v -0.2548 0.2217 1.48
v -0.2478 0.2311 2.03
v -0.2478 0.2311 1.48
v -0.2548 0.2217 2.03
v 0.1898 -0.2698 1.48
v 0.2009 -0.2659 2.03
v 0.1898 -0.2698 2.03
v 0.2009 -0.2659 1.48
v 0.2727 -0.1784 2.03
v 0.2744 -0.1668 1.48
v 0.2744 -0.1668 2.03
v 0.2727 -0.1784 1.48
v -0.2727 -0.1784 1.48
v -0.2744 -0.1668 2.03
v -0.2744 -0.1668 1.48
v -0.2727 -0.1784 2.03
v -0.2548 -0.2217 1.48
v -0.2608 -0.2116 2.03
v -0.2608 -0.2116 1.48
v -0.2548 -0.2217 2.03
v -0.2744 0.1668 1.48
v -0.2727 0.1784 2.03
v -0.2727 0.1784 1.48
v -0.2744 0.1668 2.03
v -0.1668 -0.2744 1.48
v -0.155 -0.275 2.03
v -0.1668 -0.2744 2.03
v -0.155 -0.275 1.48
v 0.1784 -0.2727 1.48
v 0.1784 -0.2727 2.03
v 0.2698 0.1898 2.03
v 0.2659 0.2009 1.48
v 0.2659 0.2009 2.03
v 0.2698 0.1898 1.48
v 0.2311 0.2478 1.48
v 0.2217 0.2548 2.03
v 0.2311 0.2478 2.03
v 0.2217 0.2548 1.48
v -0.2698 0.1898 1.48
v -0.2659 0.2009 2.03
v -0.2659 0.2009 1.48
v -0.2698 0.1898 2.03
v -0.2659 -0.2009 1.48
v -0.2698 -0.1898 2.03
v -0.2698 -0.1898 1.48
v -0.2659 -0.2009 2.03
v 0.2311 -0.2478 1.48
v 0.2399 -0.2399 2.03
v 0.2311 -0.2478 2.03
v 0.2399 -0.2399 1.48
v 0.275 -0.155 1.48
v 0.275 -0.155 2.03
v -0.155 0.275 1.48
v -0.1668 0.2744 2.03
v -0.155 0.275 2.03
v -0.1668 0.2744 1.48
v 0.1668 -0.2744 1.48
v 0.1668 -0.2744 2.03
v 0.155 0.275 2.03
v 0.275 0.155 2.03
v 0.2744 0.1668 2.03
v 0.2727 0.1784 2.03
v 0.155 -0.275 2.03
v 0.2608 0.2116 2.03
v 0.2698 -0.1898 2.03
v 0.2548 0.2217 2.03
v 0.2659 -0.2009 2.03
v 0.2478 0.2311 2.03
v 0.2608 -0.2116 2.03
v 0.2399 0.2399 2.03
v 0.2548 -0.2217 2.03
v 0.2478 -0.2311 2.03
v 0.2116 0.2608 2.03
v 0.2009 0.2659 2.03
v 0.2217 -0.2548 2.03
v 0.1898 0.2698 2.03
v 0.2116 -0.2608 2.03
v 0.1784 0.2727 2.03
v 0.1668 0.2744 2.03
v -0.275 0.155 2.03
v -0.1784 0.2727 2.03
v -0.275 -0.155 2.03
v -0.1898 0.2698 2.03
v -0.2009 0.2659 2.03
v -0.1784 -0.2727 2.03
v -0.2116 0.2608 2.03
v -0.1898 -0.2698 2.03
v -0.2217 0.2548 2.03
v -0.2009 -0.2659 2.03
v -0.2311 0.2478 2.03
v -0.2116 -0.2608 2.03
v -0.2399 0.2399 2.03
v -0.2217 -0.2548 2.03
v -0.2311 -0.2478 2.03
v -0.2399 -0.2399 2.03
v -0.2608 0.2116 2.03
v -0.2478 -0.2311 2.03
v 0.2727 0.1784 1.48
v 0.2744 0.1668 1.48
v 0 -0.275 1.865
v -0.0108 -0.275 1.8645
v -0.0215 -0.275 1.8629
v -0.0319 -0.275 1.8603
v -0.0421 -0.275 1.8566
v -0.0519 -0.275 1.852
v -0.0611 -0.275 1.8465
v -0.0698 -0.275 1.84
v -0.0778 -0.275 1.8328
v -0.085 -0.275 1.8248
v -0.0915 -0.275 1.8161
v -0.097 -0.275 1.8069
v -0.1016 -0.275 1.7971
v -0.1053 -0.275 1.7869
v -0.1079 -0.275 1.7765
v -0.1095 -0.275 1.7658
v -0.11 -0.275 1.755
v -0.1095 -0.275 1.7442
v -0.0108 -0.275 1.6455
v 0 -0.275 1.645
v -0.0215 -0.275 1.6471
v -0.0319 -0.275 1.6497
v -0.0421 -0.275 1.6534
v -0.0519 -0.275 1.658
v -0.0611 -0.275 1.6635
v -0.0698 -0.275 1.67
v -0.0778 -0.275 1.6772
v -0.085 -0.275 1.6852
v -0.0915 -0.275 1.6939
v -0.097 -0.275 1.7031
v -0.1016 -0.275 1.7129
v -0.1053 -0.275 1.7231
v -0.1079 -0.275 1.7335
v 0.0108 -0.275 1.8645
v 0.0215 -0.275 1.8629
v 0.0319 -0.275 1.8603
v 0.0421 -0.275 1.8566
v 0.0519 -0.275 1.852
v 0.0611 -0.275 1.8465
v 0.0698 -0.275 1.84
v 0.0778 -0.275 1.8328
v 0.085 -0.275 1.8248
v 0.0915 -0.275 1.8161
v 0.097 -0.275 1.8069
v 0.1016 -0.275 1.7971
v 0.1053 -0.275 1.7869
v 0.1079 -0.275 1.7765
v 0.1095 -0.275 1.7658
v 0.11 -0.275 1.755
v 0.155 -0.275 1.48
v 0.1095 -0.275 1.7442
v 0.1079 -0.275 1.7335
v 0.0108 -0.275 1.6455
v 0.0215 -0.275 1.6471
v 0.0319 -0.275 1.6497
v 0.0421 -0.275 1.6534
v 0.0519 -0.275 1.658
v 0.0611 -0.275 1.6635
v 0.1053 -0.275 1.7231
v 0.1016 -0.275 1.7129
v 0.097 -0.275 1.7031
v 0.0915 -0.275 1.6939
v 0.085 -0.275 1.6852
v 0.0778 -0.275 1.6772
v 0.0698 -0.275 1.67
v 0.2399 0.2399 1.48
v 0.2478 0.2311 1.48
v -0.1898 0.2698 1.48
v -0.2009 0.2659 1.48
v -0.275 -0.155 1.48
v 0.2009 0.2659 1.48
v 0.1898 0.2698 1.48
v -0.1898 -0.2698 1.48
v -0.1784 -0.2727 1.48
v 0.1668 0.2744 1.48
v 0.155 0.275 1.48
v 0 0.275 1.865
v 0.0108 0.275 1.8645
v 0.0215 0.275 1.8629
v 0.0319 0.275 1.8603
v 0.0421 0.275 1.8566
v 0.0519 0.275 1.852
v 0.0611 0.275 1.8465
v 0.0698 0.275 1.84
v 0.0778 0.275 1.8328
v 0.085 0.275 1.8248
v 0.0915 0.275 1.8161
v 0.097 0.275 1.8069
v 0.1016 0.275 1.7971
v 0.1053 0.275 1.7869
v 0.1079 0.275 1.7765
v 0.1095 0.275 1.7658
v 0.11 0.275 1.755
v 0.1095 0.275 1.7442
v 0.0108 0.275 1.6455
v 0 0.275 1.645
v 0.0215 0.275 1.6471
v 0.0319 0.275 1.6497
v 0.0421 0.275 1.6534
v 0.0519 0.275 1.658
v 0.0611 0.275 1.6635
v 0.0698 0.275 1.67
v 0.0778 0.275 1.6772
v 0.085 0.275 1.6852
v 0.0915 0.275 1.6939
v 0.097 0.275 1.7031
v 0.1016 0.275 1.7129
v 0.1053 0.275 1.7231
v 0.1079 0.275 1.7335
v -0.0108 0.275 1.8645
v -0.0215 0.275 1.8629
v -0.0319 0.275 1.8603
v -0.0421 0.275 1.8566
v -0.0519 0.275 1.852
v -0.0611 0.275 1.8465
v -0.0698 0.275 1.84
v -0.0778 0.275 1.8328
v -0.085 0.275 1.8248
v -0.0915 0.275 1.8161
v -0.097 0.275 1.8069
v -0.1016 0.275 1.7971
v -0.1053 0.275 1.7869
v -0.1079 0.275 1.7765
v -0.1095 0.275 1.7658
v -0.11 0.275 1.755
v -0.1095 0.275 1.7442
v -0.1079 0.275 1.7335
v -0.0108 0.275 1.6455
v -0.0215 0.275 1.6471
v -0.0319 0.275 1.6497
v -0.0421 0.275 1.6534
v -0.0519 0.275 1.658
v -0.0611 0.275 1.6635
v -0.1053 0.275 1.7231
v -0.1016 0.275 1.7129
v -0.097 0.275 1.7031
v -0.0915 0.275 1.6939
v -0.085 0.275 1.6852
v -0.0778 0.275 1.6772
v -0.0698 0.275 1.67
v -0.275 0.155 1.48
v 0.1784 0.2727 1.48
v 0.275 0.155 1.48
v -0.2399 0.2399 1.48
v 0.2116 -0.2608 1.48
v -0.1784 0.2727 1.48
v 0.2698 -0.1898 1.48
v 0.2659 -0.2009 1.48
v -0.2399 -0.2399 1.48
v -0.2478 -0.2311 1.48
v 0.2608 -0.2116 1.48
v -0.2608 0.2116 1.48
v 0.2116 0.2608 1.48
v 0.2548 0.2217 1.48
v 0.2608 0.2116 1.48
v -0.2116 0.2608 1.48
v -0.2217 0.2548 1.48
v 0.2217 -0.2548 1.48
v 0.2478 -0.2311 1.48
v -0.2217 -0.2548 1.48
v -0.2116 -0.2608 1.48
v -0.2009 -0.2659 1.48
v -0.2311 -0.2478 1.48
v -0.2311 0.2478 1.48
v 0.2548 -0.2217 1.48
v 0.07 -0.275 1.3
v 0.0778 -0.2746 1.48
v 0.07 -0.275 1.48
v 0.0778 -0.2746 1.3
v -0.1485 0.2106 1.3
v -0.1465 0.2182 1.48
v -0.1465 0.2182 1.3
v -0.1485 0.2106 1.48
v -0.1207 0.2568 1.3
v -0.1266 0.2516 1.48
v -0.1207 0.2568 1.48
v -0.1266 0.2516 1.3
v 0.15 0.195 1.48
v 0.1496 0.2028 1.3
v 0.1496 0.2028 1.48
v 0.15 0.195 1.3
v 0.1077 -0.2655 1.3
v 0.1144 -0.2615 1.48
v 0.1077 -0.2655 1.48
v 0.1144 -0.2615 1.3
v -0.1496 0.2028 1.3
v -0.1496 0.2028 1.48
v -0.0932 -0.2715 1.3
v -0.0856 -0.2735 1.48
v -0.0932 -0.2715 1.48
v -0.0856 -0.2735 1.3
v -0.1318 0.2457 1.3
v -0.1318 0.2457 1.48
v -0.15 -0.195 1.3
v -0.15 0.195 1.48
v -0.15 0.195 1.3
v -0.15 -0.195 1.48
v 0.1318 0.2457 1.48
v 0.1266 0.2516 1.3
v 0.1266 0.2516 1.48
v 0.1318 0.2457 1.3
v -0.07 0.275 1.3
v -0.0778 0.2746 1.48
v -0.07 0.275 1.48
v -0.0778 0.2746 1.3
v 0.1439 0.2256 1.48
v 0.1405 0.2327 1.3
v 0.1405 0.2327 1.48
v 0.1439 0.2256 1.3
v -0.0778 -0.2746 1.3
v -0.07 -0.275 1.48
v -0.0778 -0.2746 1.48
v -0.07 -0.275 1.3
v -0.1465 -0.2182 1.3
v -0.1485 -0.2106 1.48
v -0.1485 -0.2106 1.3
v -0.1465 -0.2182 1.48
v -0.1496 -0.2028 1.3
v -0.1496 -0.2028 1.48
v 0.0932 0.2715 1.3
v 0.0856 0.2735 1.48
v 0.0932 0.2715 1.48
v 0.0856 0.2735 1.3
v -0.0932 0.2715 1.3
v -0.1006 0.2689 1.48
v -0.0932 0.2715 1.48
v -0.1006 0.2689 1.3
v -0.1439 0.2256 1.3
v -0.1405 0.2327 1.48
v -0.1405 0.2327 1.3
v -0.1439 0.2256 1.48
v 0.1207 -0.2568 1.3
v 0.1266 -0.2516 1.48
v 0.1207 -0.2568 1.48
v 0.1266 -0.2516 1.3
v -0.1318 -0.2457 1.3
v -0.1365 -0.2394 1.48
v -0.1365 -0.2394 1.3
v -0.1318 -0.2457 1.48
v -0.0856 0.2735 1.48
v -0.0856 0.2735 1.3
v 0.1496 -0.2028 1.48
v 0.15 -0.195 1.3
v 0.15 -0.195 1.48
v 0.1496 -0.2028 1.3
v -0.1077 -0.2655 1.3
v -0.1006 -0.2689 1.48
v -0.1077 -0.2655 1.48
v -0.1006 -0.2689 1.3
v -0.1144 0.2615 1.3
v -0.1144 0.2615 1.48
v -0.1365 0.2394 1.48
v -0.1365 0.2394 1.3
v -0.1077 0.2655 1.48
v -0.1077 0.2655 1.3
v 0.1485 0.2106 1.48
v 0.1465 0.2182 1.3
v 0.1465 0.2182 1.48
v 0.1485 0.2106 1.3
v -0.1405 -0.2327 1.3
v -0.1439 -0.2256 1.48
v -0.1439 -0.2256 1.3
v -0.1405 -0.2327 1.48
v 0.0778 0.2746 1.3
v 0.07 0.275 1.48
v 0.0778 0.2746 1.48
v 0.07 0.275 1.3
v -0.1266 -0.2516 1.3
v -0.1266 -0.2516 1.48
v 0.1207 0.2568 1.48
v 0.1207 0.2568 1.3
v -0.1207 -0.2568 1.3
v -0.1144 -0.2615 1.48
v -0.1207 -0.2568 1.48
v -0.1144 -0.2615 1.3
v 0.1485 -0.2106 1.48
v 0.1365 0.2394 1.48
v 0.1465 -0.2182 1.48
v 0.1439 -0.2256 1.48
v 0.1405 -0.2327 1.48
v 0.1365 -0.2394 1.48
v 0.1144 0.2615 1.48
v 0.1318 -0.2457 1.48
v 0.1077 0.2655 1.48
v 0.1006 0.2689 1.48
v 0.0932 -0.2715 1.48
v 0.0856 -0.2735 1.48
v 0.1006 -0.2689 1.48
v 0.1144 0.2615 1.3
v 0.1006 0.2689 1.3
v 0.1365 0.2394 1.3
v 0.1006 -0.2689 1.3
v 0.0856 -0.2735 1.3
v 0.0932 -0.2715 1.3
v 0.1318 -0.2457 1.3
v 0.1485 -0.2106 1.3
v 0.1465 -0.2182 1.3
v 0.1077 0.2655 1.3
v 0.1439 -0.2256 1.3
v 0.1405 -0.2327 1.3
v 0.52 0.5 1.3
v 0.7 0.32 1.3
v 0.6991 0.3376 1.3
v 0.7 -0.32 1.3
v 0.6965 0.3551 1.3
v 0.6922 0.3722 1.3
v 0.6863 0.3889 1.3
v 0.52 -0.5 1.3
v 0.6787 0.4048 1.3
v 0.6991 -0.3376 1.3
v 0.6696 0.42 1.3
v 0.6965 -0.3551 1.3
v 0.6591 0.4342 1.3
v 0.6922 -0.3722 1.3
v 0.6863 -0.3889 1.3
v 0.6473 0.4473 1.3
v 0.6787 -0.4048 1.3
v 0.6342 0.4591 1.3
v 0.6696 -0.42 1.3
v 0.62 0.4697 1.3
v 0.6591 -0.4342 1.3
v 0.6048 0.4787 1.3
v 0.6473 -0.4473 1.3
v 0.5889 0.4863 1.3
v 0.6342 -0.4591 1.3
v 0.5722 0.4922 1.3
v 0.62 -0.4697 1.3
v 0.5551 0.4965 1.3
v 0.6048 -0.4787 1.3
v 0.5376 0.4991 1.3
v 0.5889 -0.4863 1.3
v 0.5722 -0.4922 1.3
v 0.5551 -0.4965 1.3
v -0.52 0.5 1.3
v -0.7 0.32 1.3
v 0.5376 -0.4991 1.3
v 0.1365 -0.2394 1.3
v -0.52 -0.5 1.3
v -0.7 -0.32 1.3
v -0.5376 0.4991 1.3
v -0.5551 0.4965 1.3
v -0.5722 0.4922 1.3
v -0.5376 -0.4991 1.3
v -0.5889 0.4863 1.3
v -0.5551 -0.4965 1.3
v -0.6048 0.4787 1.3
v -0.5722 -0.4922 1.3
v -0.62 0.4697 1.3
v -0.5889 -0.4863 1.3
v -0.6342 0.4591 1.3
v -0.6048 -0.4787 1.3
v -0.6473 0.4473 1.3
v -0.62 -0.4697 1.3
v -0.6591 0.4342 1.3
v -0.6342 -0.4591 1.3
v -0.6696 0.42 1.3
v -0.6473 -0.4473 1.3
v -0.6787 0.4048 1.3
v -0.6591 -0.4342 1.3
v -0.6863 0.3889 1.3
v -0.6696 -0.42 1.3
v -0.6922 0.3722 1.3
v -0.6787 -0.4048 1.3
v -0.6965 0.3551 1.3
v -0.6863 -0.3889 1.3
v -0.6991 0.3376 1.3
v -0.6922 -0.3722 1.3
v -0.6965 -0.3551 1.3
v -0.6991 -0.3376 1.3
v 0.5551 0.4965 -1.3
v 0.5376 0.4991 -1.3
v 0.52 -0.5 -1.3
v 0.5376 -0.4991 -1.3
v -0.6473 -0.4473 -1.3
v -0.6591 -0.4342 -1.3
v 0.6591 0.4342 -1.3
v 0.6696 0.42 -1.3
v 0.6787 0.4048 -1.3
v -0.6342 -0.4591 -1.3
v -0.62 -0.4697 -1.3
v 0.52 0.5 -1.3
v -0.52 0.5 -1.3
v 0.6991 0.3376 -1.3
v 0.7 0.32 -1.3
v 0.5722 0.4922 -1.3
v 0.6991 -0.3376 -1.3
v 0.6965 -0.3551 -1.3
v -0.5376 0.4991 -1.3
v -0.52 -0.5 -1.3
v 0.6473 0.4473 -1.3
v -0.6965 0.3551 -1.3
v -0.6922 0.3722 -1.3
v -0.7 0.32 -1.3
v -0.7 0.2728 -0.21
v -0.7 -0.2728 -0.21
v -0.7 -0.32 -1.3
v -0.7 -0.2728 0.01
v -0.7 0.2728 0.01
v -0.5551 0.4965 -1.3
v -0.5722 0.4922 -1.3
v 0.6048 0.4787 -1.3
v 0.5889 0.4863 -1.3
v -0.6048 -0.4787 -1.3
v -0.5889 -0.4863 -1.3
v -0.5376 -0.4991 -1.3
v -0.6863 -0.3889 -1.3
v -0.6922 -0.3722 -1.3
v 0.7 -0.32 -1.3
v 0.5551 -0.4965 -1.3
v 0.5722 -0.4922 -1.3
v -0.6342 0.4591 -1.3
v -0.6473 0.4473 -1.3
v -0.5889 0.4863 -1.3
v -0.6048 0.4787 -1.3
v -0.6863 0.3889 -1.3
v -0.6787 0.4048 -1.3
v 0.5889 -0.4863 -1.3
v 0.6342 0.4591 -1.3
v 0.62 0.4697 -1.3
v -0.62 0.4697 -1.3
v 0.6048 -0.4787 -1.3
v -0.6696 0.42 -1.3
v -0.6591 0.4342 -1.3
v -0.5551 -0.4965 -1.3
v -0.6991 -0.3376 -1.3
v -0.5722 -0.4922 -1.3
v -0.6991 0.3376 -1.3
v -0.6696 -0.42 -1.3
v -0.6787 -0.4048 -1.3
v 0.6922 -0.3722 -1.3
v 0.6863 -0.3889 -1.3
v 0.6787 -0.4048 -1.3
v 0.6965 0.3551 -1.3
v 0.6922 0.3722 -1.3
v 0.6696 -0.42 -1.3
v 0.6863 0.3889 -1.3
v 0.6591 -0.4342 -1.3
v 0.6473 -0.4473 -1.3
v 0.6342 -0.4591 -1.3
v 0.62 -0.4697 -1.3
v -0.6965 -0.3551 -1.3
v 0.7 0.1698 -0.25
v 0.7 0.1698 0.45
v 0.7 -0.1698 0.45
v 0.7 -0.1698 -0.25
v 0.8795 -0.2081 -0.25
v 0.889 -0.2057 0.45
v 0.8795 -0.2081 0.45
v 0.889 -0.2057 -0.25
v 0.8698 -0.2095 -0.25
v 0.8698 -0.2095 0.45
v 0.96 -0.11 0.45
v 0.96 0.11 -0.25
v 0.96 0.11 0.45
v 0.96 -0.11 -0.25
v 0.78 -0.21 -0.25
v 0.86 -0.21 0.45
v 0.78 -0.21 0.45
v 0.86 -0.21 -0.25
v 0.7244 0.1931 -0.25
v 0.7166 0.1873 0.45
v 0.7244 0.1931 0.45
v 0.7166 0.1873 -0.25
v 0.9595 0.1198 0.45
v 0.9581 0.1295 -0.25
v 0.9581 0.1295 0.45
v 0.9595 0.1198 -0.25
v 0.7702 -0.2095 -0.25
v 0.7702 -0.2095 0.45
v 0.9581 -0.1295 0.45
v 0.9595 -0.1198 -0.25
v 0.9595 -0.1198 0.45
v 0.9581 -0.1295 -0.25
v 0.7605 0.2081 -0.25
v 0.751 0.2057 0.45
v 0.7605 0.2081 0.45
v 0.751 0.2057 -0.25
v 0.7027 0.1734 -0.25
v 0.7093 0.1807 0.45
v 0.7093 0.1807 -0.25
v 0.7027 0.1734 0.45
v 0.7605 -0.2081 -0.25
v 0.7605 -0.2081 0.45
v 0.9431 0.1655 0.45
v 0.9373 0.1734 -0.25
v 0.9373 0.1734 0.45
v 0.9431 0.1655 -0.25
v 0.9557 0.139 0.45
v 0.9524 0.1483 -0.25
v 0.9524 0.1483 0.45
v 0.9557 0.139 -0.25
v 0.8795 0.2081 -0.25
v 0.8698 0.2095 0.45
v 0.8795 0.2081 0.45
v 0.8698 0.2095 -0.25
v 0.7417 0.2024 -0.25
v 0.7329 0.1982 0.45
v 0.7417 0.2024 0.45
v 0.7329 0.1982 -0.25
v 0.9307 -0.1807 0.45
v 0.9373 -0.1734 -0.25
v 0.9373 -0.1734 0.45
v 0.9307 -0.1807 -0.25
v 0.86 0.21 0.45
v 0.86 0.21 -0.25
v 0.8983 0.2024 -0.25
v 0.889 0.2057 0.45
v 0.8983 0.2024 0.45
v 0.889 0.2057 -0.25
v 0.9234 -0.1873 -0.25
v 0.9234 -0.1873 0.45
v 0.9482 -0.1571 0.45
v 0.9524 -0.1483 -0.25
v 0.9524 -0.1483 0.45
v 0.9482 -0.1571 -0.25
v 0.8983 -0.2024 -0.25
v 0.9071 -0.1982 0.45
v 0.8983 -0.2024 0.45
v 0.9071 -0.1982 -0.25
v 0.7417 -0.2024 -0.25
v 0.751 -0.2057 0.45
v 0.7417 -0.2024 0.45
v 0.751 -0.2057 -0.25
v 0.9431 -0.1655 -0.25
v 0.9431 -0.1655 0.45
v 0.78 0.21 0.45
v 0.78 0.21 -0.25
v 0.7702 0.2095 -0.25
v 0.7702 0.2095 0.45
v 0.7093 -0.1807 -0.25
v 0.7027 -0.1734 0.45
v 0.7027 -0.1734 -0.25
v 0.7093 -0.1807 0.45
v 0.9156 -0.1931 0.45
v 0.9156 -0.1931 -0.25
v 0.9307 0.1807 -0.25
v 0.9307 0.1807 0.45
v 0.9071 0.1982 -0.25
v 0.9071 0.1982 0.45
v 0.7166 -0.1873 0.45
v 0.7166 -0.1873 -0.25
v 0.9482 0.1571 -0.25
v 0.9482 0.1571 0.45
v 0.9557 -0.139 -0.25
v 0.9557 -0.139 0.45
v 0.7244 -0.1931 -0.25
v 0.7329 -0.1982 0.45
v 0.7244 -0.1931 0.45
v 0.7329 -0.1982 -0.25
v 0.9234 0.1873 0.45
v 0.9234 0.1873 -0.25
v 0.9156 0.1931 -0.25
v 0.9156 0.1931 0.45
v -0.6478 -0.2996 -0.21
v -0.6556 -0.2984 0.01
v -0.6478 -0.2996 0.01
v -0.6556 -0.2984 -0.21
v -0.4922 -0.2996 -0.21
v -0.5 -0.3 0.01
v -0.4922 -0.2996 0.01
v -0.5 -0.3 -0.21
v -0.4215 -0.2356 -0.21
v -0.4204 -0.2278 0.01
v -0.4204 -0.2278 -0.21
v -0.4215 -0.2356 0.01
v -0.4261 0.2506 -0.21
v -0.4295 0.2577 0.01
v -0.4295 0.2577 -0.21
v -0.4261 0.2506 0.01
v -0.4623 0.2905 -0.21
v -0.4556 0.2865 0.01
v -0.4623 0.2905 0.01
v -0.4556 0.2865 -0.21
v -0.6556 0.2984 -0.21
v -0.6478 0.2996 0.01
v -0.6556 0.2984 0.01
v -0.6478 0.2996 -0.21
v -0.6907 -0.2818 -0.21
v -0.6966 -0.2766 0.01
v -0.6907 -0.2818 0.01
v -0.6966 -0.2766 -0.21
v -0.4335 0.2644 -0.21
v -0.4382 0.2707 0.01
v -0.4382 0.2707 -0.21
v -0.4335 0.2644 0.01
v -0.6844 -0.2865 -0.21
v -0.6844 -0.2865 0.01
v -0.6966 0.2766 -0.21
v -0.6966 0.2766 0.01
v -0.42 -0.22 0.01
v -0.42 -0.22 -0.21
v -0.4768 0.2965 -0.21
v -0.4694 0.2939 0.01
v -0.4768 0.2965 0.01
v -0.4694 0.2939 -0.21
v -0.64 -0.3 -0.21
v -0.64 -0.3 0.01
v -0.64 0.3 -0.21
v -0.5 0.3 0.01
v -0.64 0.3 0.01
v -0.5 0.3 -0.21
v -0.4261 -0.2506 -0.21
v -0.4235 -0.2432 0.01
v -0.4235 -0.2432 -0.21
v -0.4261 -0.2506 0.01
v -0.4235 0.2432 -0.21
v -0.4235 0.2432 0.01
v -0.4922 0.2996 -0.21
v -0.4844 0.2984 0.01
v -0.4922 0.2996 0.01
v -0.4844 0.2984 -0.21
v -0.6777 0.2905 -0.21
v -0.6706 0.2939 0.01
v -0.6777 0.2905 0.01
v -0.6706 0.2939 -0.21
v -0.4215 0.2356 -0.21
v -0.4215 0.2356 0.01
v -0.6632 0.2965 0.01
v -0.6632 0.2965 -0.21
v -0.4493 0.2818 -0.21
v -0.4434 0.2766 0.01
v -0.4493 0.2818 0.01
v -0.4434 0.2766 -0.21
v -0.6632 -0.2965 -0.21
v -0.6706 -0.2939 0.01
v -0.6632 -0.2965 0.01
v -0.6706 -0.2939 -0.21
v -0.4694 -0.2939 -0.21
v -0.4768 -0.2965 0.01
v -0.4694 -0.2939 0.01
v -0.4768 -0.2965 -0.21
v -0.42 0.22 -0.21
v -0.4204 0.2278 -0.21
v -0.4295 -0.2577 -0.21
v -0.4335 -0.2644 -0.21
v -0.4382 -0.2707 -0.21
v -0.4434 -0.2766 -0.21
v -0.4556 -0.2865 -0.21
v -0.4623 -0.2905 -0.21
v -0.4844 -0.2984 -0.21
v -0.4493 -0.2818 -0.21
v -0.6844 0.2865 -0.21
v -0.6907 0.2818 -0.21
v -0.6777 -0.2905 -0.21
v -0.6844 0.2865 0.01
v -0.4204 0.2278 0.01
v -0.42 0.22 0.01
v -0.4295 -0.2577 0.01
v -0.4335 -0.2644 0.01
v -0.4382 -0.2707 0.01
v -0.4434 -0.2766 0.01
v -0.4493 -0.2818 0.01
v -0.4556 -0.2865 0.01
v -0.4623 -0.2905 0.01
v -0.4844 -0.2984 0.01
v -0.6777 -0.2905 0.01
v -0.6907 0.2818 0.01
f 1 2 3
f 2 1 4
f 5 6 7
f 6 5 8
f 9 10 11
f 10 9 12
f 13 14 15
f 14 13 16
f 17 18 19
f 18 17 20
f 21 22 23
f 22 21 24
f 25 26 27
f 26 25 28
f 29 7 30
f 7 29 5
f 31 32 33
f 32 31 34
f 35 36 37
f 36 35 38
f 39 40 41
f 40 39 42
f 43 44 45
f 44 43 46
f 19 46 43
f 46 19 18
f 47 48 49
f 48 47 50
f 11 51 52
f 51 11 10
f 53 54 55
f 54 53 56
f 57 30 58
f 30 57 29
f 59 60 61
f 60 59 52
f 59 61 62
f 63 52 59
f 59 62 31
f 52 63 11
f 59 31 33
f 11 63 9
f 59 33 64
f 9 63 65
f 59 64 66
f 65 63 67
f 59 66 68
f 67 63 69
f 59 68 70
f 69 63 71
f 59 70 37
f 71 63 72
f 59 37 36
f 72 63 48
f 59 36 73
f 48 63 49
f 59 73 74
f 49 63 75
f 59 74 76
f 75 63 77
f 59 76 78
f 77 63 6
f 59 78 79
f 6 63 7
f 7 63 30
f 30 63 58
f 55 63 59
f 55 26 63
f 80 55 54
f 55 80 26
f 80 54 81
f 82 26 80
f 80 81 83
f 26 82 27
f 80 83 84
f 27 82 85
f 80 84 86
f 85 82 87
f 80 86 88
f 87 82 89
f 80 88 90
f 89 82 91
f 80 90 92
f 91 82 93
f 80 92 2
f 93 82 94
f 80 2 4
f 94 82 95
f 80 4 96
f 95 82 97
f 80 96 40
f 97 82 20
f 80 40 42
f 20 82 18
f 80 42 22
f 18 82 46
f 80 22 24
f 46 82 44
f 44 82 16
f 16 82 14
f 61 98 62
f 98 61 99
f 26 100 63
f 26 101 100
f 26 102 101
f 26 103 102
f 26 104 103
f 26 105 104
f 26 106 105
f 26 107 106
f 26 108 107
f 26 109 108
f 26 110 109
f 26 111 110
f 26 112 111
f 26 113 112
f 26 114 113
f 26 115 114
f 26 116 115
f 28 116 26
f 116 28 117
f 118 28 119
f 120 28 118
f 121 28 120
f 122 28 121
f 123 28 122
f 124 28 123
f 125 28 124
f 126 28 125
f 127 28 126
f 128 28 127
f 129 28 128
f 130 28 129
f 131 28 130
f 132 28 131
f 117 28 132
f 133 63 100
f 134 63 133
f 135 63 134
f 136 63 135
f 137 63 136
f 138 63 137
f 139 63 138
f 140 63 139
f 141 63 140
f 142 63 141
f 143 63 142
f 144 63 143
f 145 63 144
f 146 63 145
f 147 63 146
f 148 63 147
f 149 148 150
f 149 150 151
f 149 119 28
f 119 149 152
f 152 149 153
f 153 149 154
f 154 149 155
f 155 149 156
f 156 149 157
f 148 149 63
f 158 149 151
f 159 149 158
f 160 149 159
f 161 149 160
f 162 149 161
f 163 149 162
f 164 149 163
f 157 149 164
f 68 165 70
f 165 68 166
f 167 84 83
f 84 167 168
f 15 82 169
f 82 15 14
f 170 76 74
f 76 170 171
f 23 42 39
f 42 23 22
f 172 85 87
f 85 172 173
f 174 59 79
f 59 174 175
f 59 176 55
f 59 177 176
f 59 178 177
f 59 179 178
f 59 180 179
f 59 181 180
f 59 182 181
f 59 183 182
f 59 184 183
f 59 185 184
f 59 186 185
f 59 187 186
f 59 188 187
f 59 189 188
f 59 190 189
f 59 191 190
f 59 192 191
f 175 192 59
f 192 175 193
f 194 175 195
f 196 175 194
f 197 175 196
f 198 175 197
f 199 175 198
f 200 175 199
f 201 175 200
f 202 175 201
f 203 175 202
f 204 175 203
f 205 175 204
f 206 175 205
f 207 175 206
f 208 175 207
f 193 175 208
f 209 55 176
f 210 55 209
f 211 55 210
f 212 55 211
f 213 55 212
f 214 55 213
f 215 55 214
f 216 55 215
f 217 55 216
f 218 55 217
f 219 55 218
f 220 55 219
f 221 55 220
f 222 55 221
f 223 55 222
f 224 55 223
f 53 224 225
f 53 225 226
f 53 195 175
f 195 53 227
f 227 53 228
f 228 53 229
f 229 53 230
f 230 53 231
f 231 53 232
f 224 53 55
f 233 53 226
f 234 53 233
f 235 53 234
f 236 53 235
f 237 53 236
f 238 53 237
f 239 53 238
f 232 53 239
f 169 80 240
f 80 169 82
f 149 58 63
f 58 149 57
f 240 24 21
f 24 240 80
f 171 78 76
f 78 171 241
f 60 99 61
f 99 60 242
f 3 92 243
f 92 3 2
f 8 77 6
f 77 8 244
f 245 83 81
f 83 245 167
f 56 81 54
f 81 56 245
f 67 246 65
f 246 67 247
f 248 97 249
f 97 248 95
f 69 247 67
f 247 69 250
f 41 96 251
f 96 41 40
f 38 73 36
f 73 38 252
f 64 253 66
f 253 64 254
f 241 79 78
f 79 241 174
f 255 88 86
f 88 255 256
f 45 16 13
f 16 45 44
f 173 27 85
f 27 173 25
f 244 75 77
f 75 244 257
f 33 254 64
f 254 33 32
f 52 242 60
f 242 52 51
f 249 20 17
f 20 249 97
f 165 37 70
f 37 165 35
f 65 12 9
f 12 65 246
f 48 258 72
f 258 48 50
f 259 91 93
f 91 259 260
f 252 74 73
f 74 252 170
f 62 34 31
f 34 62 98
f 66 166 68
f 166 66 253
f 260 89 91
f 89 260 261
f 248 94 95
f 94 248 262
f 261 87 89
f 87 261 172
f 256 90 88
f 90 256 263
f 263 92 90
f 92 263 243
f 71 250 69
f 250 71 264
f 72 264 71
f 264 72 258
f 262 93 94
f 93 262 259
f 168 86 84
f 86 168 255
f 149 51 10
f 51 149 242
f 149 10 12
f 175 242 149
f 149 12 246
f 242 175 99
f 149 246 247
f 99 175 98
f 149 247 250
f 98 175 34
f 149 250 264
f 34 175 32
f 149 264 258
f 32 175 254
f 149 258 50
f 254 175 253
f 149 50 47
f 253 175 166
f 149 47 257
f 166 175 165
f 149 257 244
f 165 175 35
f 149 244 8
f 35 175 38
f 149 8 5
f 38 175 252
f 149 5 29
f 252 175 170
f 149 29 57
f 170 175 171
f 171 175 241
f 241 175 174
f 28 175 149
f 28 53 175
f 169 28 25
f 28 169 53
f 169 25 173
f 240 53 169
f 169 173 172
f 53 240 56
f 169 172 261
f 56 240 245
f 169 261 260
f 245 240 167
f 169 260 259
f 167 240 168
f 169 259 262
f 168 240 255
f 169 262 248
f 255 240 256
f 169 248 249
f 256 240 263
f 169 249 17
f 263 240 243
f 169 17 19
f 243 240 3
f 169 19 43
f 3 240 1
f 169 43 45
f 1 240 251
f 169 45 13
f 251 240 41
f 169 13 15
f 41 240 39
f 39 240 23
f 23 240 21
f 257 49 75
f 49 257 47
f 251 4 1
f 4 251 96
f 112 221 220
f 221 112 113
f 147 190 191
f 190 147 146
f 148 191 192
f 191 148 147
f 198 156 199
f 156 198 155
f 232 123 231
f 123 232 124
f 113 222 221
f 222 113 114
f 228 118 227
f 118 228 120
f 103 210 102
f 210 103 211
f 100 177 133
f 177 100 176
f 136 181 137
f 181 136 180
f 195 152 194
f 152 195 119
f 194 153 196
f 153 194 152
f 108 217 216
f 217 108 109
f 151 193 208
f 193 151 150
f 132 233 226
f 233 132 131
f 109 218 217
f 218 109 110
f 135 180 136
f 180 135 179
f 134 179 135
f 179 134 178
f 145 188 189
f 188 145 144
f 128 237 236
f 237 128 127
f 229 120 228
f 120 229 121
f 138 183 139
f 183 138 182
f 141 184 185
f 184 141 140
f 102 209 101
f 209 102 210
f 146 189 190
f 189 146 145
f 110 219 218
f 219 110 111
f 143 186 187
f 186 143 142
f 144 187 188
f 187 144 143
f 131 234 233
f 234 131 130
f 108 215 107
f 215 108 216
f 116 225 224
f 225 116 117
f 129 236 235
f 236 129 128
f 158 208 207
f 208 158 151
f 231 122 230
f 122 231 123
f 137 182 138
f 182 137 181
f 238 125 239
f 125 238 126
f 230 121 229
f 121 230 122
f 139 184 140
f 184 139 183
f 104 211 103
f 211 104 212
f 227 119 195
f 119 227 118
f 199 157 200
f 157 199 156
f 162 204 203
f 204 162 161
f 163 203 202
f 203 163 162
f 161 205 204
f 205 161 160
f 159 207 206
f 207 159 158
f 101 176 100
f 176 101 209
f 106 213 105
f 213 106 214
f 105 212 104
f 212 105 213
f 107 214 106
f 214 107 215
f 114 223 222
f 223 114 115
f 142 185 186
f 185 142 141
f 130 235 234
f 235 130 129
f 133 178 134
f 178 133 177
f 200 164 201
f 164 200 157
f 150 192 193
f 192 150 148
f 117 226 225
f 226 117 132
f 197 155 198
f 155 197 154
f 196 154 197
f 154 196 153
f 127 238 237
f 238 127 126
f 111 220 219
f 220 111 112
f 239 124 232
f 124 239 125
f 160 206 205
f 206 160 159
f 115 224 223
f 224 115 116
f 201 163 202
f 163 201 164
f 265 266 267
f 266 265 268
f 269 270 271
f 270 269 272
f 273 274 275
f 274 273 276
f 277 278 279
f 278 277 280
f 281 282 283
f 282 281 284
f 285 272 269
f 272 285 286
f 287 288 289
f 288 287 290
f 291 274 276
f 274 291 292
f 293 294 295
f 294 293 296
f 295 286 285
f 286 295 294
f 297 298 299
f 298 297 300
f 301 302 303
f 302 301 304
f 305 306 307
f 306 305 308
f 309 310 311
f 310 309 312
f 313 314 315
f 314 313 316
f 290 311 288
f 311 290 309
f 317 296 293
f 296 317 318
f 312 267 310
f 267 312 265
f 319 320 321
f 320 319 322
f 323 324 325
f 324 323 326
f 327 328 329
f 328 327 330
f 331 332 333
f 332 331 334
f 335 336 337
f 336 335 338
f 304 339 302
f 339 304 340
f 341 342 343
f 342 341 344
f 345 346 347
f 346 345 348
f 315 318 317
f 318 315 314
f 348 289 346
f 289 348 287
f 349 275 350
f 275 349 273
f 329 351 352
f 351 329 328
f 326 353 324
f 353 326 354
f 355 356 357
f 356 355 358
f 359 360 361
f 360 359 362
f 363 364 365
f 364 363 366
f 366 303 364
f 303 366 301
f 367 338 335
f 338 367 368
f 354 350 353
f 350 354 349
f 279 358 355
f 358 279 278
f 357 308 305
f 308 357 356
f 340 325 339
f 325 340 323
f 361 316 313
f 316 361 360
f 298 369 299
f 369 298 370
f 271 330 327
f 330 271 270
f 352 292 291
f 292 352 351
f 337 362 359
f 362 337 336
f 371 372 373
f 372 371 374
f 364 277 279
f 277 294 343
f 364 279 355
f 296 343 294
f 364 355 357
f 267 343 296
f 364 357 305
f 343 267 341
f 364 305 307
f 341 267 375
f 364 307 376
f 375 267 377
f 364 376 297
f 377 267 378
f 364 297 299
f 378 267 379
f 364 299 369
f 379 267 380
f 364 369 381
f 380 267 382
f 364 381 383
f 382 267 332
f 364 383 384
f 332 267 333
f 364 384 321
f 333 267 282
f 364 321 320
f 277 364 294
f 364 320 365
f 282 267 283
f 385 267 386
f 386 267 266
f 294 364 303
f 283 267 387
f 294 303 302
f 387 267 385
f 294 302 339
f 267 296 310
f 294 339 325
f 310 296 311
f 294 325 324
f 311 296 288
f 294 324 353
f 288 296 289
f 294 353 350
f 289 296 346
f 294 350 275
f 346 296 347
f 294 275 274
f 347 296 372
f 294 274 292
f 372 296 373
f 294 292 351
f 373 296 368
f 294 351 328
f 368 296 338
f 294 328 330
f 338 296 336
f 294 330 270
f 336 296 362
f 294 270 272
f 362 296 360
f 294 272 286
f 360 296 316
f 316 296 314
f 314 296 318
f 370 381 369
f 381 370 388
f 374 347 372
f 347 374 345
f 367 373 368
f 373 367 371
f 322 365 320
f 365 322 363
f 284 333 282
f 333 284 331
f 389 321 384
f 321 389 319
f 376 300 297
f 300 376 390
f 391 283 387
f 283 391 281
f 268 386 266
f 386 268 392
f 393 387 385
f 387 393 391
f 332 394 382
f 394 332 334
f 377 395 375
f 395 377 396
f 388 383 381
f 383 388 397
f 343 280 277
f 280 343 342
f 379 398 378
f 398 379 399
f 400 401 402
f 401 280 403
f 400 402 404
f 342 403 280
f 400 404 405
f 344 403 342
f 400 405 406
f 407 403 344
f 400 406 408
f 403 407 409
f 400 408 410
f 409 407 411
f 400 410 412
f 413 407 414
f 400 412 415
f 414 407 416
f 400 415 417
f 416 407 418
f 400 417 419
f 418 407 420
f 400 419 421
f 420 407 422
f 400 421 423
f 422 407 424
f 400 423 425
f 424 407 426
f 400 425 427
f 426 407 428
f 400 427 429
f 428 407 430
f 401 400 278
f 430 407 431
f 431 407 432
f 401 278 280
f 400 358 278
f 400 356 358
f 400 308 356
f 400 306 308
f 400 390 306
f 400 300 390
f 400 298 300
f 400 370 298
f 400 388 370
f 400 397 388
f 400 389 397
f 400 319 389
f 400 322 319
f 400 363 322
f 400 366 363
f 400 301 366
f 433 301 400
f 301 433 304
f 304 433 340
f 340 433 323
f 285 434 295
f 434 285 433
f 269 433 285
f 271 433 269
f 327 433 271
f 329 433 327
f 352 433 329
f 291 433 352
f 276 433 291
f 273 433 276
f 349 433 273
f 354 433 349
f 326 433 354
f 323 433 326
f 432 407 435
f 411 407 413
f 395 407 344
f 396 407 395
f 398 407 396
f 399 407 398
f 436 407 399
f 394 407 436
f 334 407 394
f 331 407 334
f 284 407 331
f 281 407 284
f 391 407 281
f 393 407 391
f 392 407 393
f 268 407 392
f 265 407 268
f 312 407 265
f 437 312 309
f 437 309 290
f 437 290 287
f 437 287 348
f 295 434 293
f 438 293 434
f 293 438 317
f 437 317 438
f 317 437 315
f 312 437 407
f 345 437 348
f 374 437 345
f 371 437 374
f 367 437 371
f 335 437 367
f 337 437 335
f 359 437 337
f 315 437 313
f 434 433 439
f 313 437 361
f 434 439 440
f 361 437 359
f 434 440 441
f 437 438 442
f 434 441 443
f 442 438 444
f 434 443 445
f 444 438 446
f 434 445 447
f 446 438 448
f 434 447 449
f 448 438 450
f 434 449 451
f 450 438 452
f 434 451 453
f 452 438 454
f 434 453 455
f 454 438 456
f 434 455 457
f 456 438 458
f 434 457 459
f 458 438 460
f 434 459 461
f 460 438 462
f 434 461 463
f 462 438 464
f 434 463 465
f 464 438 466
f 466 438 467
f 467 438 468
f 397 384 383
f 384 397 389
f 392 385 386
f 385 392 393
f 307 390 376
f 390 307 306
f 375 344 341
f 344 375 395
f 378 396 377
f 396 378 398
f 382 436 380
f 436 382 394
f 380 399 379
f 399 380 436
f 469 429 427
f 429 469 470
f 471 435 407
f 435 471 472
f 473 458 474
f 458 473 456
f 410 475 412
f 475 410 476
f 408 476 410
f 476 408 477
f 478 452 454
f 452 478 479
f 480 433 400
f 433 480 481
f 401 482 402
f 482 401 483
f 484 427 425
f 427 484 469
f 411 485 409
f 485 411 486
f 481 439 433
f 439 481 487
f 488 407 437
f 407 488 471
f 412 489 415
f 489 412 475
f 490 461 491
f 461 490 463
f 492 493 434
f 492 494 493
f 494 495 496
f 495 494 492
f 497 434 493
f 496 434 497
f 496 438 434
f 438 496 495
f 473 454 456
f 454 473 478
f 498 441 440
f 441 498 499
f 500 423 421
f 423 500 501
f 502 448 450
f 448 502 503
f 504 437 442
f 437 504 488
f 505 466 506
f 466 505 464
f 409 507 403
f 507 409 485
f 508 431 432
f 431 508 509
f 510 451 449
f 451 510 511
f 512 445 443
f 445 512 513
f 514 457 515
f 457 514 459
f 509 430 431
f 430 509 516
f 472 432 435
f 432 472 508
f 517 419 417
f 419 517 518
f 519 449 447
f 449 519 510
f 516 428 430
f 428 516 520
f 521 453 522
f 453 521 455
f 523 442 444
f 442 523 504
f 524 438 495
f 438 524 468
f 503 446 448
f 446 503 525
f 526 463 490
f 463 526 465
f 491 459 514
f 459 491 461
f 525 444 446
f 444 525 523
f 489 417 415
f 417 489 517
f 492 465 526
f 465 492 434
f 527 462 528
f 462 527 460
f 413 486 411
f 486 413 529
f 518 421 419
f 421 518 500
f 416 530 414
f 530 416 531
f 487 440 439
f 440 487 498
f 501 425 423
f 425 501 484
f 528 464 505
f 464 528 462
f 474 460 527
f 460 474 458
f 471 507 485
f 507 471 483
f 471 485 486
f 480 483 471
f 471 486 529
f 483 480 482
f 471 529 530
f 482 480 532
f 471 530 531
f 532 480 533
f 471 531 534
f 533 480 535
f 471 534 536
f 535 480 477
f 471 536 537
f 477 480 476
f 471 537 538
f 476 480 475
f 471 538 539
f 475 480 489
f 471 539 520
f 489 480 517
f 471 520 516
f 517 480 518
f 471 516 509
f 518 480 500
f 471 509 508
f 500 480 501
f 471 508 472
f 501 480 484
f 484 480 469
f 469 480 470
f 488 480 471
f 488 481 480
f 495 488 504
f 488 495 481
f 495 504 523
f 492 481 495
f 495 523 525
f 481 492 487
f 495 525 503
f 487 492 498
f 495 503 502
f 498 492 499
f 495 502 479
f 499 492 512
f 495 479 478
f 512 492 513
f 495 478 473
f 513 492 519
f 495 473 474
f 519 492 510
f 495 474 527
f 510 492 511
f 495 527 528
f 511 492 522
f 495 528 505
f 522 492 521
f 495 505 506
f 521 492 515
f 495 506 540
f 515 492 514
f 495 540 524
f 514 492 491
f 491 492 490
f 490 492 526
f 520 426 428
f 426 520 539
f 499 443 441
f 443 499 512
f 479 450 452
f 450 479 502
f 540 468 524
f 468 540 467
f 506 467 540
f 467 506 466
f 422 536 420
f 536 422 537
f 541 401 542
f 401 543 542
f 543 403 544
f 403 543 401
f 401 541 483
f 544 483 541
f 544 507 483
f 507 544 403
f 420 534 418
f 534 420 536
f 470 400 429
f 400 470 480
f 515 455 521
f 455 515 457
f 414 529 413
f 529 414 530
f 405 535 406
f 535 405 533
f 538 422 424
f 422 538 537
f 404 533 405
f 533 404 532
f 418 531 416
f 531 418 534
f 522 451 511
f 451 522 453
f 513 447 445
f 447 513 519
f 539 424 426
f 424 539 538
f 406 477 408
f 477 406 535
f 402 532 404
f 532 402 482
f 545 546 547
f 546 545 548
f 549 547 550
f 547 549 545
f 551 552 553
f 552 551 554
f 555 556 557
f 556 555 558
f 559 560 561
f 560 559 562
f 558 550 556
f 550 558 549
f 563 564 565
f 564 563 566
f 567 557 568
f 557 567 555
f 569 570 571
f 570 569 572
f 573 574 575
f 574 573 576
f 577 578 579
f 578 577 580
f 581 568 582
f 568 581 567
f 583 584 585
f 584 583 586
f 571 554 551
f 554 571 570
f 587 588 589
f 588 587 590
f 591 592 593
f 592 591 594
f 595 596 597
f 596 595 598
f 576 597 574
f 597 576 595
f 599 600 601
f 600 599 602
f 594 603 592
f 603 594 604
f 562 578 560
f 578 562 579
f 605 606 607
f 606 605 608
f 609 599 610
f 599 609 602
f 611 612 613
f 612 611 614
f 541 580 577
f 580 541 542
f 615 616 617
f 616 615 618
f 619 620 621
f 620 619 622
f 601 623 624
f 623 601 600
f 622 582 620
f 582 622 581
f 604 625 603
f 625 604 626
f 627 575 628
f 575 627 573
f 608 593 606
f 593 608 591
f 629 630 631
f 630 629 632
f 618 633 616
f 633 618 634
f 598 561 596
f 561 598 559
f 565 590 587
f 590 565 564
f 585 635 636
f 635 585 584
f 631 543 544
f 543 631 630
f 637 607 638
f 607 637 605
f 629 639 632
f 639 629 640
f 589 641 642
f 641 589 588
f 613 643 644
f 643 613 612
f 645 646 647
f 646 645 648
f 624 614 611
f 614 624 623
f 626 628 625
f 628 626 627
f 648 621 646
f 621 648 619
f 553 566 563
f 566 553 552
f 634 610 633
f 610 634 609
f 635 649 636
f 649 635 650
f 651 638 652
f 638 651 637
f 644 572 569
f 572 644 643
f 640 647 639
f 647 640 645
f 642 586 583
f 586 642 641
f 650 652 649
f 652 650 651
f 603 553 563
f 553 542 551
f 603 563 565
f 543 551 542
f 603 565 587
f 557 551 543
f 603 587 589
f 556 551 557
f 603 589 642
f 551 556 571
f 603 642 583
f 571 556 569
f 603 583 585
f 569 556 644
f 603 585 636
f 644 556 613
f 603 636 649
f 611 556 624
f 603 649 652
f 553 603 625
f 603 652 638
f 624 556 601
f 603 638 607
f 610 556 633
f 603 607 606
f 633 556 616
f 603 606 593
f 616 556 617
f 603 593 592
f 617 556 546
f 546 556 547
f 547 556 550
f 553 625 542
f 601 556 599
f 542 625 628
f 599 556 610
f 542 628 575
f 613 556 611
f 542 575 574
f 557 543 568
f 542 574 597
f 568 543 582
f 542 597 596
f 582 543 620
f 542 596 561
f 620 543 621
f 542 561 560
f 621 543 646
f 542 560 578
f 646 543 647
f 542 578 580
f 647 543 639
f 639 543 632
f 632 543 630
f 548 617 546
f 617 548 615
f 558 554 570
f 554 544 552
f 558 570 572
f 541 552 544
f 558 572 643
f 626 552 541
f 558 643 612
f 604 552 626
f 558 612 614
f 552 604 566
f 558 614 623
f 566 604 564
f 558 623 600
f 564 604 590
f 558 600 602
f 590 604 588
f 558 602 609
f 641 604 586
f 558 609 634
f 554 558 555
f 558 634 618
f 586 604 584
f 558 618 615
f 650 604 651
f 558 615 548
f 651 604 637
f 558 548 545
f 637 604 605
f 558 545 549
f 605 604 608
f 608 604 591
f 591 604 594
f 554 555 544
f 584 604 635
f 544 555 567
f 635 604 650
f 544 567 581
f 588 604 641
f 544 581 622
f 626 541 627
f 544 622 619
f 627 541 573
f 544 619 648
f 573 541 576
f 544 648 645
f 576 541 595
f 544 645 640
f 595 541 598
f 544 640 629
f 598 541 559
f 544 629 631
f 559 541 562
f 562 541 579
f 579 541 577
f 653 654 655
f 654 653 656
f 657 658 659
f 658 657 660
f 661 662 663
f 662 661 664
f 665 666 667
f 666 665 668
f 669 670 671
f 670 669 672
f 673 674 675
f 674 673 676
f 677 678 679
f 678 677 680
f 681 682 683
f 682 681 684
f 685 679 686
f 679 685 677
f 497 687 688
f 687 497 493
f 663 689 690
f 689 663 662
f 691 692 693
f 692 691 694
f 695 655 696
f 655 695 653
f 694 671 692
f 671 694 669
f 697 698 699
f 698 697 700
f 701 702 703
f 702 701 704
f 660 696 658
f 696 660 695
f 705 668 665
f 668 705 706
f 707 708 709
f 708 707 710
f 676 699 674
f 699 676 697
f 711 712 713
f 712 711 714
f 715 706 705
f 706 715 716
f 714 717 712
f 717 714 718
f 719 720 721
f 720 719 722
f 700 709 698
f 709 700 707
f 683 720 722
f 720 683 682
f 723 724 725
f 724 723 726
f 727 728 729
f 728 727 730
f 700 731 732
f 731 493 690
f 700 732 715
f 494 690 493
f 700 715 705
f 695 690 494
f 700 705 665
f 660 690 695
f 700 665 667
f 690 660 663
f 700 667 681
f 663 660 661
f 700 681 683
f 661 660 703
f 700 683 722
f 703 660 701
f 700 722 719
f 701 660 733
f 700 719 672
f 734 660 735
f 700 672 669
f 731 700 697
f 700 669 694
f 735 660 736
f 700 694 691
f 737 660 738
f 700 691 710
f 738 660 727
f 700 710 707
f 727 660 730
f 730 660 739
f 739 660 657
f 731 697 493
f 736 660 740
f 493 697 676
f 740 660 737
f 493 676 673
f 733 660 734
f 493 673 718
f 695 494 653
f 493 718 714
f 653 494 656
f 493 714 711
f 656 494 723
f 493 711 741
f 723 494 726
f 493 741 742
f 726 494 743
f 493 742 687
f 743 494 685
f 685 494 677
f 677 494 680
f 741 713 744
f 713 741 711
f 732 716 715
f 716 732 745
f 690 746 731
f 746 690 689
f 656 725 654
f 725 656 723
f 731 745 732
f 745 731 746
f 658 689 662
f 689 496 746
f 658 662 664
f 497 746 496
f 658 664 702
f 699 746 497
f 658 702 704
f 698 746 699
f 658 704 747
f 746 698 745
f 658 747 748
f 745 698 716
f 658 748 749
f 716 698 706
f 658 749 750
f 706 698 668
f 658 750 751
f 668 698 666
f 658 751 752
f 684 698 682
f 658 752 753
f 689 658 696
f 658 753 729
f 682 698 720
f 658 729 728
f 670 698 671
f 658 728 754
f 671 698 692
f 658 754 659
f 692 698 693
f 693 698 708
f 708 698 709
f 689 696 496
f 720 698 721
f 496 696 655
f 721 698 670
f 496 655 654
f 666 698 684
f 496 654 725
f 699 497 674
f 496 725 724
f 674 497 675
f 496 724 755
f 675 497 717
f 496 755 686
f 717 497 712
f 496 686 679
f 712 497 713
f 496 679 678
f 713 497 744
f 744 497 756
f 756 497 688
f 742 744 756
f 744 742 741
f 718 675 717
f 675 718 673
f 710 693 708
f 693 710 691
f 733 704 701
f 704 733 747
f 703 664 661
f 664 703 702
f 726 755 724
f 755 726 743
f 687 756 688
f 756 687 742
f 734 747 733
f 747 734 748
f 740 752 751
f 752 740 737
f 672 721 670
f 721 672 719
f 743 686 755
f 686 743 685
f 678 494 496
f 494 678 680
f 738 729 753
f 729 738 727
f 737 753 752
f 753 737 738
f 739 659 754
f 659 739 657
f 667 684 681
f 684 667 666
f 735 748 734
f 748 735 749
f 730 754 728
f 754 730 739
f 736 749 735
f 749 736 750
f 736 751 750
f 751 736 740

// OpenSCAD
$fn=64;

module rounded_box(size=[1.4,1.0,2.6], r=0.18){
    x=size[0]; y=size[1]; z=size[2];
    r2=min(r, x/2-0.001, y/2-0.001);
    linear_extrude(height=z, center=true)
        offset(r=r2)
            square([x-2*r2, y-2*r2], center=true);
}

module latch_boss(boss=[0.28,0.42,0.70], r=0.10){
    bx=boss[0]; by=boss[1]; bz=boss[2];
    r2=min(r, bx/2-0.001, by/2-0.001);
    linear_extrude(height=bz, center=true)
        offset(r=r2)
            square([bx-2*r2, by-2*r2], center=true);
}

module tab_with_hole(tab_len=0.55, tab_w=0.55, tab_t=0.55, neck_len=0.18, neck_w=0.30, hole_d=0.22, r=0.12){
    union(){
        translate([0,0,(2.6/2) + neck_len/2])
            linear_extrude(height=neck_len, center=true)
                offset(r=min(0.08, neck_w/2-0.001, 1.0))
                    square([neck_w-2*min(0.08, neck_w/2-0.001, 1.0), 0.55-2*min(0.08, neck_w/2-0.001, 1.0)], center=true);

        translate([0,0,(2.6/2) + neck_len + tab_len/2])
            difference(){
                linear_extrude(height=tab_len, center=true)
                    offset(r=min(r, tab_w/2-0.001, tab_t/2-0.001))
                        square([tab_w-2*min(r, tab_w/2-0.001, tab_t/2-0.001), tab_t-2*min(r, tab_w/2-0.001, tab_t/2-0.001)], center=true);
                rotate([90,0,0])
                    cylinder(d=hole_d, h=tab_t+0.6, center=true);
            }
    }
}

module housing(){
    main_size=[1.4,1.0,2.6];
    main_r=0.18;

    boss_size=[0.28,0.42,0.70];
    boss_r=0.10;

    notch_size=[0.30,0.60,0.22];
    notch_r=0.08;

    difference(){
        union(){
            rounded_box(main_size, main_r);

            translate([ (main_size[0]/2) + boss_size[0]/2 - 0.02, 0, 0.10 ])
                latch_boss(boss_size, boss_r);

            tab_with_hole(
                tab_len=0.55,
                tab_w=0.55,
                tab_t=0.55,
                neck_len=0.18,
                neck_w=0.30,
                hole_d=0.22,
                r=0.12
            );
        }

        translate([ -(main_size[0]/2) + notch_size[0]/2 - 0.02, 0, -0.10 ])
            linear_extrude(height=notch_size[2], center=true)
                offset(r=min(notch_r, notch_size[0]/2-0.001, notch_size[1]/2-0.001))
                    square([notch_size[0]-2*min(notch_r, notch_size[0]/2-0.001, notch_size[1]/2-0.001),
                            notch_size[1]-2*min(notch_r, notch_size[0]/2-0.001, notch_size[1]/2-0.001)], center=true);
    }
}

housing();
